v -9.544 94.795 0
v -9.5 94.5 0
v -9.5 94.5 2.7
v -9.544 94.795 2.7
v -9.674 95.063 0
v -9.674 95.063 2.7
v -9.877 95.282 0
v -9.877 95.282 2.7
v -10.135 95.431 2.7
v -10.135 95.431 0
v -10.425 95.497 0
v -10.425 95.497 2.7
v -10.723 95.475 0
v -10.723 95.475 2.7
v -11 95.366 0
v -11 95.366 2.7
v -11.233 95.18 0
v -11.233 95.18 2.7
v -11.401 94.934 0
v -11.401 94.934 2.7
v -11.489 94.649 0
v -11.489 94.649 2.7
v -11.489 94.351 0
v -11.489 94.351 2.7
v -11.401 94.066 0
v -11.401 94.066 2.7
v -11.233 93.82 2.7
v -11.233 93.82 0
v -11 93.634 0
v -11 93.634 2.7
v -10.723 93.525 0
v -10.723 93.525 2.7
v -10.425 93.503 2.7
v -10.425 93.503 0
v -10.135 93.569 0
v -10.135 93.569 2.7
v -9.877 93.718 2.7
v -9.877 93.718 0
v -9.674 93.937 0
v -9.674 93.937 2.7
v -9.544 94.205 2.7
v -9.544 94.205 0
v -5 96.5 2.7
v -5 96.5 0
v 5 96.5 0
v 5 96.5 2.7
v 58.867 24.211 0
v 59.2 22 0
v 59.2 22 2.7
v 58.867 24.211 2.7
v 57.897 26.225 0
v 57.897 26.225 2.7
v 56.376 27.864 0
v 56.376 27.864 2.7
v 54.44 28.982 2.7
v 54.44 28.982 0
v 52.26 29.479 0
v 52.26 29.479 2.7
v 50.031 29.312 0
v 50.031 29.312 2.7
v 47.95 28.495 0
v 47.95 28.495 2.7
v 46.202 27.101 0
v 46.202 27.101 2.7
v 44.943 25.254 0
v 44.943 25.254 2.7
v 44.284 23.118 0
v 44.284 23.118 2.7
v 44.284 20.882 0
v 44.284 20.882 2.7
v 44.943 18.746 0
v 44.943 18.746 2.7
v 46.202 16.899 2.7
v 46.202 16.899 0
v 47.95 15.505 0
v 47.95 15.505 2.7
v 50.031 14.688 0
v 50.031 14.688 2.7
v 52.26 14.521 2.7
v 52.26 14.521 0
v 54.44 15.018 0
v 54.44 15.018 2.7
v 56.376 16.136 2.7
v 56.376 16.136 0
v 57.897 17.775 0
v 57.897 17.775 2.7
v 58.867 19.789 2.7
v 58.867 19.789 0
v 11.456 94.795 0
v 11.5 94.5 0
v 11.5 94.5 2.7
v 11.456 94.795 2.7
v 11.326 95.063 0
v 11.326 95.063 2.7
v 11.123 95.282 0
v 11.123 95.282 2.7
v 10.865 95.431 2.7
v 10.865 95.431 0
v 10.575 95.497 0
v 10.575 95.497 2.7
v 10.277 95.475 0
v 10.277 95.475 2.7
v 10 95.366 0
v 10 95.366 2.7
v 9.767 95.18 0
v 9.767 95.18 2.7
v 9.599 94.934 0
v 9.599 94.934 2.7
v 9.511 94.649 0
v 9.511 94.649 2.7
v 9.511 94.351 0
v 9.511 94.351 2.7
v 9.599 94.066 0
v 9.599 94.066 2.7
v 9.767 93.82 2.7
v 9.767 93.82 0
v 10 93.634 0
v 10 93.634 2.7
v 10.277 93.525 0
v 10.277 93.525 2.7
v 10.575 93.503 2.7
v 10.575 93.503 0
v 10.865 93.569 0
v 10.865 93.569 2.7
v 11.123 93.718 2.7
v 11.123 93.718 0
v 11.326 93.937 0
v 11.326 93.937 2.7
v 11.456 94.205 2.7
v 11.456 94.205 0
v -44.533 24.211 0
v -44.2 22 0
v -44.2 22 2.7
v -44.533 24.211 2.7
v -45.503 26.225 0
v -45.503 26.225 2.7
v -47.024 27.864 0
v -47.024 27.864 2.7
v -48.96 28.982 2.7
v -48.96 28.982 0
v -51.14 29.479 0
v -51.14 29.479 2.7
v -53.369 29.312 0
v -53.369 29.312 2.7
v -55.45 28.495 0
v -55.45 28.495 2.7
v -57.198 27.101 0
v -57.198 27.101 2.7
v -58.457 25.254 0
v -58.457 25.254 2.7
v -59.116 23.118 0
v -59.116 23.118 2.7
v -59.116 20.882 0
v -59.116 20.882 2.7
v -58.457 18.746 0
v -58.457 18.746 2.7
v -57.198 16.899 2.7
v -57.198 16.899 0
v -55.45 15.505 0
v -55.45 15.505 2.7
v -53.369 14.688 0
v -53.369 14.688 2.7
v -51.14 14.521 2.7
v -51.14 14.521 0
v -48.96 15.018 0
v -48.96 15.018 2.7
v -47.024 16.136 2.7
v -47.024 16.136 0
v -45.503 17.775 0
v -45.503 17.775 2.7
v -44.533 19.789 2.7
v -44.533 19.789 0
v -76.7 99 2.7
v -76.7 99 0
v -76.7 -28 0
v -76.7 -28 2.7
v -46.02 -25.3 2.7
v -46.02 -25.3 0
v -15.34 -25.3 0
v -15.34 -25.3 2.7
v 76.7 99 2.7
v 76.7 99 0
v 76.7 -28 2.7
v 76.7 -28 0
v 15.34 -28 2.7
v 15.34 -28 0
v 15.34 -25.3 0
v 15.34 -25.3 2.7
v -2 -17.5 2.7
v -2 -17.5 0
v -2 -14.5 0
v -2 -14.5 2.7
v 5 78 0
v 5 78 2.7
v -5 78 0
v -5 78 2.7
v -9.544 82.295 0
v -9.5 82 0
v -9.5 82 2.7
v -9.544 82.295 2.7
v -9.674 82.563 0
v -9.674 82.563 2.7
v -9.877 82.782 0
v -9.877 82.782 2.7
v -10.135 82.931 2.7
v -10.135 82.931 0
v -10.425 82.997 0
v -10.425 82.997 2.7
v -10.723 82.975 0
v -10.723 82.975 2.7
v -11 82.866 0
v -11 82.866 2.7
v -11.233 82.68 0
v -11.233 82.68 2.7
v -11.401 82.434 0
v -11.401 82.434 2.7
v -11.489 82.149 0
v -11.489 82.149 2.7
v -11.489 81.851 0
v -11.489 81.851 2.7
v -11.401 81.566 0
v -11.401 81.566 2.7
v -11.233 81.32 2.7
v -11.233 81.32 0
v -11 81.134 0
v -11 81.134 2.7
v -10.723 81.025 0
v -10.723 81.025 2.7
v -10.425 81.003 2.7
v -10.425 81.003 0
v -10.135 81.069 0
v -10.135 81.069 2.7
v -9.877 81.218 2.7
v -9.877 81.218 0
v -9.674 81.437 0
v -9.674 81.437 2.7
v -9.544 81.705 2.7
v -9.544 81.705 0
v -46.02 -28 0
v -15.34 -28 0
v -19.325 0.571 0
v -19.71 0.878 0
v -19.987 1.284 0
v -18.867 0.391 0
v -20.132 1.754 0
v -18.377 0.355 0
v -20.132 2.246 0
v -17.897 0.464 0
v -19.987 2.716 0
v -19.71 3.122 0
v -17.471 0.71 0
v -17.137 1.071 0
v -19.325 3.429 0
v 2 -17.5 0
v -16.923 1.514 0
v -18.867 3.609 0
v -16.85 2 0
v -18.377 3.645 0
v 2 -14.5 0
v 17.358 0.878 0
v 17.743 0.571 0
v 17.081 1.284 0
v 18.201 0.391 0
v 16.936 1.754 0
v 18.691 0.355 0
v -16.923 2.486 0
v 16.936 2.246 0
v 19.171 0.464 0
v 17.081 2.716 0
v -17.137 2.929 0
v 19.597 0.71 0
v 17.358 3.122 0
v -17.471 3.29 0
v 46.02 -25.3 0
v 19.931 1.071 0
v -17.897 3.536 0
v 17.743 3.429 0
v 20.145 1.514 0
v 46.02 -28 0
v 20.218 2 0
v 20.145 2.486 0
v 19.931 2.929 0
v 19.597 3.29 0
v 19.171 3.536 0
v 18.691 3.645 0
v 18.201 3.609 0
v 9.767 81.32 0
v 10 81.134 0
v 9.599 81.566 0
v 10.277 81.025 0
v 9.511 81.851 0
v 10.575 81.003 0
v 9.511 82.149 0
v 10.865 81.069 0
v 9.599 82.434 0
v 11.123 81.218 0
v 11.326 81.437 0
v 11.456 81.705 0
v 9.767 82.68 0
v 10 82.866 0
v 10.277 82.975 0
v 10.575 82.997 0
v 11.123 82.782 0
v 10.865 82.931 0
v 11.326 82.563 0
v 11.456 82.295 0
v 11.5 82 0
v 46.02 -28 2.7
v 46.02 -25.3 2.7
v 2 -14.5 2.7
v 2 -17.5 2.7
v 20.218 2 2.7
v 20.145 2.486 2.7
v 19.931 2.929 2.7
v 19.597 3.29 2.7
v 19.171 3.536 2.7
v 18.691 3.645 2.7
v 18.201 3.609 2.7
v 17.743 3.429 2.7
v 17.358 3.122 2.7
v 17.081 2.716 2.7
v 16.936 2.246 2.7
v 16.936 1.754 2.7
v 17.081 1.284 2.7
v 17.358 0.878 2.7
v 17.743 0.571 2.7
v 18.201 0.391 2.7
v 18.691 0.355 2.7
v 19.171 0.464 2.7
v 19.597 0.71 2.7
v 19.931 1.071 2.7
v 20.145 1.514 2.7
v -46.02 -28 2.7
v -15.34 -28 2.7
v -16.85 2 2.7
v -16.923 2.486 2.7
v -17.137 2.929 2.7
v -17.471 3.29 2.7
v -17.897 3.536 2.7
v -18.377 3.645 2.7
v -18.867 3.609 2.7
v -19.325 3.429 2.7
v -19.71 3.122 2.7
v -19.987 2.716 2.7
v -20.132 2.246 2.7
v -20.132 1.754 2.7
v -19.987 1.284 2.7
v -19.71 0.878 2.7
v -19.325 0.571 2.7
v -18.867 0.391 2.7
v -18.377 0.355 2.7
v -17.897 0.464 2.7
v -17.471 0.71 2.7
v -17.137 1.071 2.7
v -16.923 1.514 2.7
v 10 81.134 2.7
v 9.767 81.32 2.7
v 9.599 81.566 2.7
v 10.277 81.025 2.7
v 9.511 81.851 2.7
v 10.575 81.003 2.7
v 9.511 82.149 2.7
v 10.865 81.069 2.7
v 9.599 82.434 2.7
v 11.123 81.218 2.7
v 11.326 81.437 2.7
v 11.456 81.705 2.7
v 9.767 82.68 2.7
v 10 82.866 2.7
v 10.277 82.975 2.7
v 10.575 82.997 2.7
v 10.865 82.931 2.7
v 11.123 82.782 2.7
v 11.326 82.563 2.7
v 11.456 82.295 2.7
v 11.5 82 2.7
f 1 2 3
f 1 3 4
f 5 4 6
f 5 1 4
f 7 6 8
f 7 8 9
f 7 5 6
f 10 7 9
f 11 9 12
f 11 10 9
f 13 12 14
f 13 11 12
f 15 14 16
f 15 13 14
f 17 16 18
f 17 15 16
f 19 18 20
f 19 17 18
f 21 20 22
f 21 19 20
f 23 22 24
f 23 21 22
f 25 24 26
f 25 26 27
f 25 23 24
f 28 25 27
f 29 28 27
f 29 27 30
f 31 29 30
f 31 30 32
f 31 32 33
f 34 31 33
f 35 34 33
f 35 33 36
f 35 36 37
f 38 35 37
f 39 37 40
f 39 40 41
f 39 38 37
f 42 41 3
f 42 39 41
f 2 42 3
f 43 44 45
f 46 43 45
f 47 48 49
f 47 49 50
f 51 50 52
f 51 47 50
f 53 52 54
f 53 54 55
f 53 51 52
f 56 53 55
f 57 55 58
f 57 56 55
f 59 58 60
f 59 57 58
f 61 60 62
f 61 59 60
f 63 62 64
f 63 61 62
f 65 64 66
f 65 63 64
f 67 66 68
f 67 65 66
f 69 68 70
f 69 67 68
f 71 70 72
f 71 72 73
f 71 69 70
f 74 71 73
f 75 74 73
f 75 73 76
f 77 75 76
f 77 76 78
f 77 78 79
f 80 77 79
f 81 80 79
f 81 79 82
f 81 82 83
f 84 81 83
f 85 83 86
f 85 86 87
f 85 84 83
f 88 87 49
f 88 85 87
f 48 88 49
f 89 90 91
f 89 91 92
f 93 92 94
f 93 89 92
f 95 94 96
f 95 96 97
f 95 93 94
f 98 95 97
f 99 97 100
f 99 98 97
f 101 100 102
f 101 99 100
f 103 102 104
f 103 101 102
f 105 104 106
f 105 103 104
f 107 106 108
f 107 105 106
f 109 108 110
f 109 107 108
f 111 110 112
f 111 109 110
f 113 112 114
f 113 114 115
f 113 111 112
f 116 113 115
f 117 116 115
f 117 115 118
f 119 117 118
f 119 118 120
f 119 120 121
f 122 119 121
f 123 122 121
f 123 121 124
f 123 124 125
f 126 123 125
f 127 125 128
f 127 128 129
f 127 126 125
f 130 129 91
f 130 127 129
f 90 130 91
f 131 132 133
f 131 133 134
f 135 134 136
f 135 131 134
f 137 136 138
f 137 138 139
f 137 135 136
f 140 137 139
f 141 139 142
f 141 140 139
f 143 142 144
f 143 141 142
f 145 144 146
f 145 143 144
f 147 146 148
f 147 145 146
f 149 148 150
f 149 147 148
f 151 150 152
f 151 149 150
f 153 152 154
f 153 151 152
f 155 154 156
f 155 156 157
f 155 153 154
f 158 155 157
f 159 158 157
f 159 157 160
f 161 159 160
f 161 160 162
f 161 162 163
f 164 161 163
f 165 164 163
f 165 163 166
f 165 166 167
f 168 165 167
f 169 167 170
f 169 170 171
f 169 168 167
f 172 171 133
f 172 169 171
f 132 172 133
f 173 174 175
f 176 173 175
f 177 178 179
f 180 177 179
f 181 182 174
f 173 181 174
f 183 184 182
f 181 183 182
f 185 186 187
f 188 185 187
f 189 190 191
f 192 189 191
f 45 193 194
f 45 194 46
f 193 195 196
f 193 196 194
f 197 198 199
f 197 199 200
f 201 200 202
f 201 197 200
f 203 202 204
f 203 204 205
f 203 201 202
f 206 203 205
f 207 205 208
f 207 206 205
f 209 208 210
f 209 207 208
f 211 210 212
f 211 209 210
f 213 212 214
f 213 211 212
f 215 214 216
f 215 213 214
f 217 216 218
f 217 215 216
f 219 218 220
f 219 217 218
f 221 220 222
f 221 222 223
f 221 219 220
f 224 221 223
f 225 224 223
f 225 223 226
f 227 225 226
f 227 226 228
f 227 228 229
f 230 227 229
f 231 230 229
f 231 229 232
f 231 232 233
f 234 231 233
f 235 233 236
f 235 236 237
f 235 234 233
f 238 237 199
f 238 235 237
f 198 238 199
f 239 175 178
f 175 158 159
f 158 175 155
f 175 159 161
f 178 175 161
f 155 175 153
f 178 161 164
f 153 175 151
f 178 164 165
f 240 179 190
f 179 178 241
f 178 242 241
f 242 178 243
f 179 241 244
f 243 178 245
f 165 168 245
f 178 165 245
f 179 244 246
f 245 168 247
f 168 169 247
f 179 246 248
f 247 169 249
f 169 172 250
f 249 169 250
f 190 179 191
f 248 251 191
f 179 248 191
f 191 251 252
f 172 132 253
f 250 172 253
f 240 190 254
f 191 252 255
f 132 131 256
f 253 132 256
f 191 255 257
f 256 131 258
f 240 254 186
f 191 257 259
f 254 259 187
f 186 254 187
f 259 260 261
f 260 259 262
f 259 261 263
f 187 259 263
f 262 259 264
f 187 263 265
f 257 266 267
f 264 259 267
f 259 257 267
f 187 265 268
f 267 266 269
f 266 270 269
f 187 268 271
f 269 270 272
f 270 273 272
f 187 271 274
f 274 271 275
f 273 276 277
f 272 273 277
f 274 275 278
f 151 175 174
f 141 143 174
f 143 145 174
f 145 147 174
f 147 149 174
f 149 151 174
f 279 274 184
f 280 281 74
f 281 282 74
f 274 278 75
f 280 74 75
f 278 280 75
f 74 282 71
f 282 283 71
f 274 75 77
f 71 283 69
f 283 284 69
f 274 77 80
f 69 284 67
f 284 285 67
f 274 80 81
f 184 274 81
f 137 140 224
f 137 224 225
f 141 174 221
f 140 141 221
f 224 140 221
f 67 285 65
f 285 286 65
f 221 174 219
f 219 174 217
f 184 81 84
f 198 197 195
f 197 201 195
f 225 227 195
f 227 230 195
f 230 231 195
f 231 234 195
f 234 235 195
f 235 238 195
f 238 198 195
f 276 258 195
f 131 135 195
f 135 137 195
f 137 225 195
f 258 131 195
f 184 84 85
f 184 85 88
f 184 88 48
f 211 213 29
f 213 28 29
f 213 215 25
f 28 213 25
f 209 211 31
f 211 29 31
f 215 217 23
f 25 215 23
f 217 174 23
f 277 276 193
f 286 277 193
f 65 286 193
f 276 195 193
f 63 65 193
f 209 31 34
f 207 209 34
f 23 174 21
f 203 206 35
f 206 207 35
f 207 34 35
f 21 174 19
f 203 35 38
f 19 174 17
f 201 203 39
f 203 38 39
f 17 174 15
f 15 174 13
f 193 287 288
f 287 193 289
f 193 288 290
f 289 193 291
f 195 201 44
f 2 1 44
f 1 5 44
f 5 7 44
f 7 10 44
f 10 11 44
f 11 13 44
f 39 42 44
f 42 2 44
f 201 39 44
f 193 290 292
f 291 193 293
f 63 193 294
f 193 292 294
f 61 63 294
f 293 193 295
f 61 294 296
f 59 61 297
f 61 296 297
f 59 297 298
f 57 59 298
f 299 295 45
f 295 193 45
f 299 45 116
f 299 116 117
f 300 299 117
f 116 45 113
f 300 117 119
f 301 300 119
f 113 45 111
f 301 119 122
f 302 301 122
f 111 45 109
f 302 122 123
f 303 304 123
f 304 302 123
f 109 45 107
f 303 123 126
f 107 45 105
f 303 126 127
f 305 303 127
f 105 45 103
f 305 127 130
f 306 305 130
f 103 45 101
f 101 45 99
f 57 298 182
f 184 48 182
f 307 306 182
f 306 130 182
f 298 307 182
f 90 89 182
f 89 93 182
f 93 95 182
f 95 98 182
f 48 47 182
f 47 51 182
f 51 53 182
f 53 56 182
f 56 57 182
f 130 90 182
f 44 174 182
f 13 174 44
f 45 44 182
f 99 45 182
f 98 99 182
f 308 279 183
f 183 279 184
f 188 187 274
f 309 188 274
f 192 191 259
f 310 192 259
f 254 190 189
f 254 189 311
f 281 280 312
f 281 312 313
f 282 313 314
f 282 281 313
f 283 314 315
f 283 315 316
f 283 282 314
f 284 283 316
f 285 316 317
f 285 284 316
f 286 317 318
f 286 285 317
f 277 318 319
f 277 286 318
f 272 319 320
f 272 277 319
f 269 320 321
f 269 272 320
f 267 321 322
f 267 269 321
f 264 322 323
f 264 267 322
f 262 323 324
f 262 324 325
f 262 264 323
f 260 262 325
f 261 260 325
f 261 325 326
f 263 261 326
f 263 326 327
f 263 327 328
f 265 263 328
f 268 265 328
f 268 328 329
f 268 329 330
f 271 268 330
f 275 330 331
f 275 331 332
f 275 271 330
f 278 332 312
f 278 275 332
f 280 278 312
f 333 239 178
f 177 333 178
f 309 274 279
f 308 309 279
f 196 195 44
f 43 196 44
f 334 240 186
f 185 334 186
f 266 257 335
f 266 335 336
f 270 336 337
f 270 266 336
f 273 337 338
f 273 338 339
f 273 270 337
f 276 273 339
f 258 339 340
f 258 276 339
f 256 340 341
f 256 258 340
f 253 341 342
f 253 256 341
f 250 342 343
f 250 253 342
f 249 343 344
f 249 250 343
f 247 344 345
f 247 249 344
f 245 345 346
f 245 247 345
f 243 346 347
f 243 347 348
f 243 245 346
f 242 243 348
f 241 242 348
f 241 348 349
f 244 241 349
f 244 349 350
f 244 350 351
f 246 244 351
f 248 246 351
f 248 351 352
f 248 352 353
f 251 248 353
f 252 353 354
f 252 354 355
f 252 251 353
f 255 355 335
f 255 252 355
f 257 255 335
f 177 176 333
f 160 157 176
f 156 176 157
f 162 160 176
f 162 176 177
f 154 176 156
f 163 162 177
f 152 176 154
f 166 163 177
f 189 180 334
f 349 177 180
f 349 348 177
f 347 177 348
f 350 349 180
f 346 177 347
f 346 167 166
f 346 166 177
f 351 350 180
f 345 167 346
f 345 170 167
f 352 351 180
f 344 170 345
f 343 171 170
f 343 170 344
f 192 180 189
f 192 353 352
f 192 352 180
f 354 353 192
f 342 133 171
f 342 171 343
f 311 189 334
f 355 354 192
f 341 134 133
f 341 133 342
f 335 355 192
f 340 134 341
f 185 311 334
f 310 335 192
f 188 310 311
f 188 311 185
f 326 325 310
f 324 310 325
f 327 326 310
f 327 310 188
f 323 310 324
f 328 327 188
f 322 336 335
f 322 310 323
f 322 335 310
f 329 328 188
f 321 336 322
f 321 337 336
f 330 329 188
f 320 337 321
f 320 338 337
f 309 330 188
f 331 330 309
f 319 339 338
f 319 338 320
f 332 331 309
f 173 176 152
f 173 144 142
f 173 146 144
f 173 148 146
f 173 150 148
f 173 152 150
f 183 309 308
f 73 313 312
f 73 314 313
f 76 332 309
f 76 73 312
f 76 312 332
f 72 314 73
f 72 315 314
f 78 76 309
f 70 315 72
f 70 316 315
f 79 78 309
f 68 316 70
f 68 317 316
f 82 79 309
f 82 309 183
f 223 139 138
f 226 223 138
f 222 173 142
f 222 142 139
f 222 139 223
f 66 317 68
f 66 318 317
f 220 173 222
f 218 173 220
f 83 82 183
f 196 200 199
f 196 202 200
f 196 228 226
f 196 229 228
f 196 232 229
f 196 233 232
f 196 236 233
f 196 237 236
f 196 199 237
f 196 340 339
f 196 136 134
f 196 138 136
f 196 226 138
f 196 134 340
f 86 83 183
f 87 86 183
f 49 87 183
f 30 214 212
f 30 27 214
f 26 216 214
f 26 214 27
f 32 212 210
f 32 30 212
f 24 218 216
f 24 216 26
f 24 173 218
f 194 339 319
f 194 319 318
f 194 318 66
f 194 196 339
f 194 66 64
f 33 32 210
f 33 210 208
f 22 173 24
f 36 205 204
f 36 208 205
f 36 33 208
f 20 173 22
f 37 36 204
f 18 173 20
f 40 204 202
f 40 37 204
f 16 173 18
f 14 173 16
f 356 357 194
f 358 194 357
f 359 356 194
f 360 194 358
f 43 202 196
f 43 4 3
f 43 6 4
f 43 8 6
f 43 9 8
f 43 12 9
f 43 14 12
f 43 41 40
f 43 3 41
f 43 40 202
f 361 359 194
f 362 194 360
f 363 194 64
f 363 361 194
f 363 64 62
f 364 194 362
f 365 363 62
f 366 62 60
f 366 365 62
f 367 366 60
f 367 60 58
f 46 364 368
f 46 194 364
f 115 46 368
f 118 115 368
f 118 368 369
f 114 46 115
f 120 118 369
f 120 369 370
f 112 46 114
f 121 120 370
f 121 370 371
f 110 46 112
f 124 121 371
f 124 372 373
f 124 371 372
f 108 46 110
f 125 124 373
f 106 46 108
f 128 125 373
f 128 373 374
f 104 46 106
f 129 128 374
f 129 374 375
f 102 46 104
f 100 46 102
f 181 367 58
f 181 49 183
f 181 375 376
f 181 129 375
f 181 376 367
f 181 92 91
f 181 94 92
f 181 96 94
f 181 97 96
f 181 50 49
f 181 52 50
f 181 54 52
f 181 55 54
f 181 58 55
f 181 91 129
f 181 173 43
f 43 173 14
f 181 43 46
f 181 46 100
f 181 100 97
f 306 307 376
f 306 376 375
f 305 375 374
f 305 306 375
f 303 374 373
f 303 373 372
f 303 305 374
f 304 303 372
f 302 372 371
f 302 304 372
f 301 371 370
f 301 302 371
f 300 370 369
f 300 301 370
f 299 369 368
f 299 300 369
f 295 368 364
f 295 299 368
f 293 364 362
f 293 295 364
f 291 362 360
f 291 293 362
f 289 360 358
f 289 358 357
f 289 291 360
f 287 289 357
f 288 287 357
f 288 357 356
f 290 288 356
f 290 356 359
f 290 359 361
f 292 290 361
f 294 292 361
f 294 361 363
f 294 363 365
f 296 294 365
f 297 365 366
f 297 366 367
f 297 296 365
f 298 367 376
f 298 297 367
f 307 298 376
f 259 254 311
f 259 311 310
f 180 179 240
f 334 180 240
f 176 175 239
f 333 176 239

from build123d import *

# Parameters (mm, degrees)
SKETCH1_R           = 1.65
SKETCH1_R_2         = 7.5
SKETCH1_R_3         = 1
SKETCH1_W           = 4
SKETCH1_H           = 3
SKETCH1_W_2         = 10
SKETCH1_H_2         = 18.5
BOSS_EXTRUDE3_DEPTH = 2.7


with BuildPart() as part:
    # Sketch1 → Boss-Extrude3 (new body)
    with BuildSketch(Plane.XY):
        Polygon((-46.02, -28), (-46.02, -25.3), (-15.34, -25.3), (-15.34, -28), (15.34, -28), (15.34, -25.3), (46.02, -25.3), (46.02, -28), (76.7, -28), (76.7, 99), (-76.7, 99), (-76.7, -28), align=None)
        with Locations((-18.5, 2)):
            Circle(SKETCH1_R, mode=Mode.SUBTRACT)
        with Locations((18.567940233, 2)):
            Circle(SKETCH1_R, mode=Mode.SUBTRACT)
        with Locations((-51.7, 22)):
            Circle(SKETCH1_R_2, mode=Mode.SUBTRACT)
        with Locations((51.7, 22)):
            Circle(SKETCH1_R_2, mode=Mode.SUBTRACT)
        with Locations((10.5, 94.5)):
            Circle(SKETCH1_R_3, mode=Mode.SUBTRACT)
        with Locations((-10.5, 82)):
            Circle(SKETCH1_R_3, mode=Mode.SUBTRACT)
        with Locations((-10.5, 94.5)):
            Circle(SKETCH1_R_3, mode=Mode.SUBTRACT)
        with Locations((10.5, 82)):
            Circle(SKETCH1_R_3, mode=Mode.SUBTRACT)
        with Locations((0, -16)):
            Rectangle(SKETCH1_W, SKETCH1_H, mode=Mode.SUBTRACT)
        with Locations((0, 87.25)):
            Rectangle(SKETCH1_W_2, SKETCH1_H_2, mode=Mode.SUBTRACT)
    extrude(amount=BOSS_EXTRUDE3_DEPTH)


solid = part.part
